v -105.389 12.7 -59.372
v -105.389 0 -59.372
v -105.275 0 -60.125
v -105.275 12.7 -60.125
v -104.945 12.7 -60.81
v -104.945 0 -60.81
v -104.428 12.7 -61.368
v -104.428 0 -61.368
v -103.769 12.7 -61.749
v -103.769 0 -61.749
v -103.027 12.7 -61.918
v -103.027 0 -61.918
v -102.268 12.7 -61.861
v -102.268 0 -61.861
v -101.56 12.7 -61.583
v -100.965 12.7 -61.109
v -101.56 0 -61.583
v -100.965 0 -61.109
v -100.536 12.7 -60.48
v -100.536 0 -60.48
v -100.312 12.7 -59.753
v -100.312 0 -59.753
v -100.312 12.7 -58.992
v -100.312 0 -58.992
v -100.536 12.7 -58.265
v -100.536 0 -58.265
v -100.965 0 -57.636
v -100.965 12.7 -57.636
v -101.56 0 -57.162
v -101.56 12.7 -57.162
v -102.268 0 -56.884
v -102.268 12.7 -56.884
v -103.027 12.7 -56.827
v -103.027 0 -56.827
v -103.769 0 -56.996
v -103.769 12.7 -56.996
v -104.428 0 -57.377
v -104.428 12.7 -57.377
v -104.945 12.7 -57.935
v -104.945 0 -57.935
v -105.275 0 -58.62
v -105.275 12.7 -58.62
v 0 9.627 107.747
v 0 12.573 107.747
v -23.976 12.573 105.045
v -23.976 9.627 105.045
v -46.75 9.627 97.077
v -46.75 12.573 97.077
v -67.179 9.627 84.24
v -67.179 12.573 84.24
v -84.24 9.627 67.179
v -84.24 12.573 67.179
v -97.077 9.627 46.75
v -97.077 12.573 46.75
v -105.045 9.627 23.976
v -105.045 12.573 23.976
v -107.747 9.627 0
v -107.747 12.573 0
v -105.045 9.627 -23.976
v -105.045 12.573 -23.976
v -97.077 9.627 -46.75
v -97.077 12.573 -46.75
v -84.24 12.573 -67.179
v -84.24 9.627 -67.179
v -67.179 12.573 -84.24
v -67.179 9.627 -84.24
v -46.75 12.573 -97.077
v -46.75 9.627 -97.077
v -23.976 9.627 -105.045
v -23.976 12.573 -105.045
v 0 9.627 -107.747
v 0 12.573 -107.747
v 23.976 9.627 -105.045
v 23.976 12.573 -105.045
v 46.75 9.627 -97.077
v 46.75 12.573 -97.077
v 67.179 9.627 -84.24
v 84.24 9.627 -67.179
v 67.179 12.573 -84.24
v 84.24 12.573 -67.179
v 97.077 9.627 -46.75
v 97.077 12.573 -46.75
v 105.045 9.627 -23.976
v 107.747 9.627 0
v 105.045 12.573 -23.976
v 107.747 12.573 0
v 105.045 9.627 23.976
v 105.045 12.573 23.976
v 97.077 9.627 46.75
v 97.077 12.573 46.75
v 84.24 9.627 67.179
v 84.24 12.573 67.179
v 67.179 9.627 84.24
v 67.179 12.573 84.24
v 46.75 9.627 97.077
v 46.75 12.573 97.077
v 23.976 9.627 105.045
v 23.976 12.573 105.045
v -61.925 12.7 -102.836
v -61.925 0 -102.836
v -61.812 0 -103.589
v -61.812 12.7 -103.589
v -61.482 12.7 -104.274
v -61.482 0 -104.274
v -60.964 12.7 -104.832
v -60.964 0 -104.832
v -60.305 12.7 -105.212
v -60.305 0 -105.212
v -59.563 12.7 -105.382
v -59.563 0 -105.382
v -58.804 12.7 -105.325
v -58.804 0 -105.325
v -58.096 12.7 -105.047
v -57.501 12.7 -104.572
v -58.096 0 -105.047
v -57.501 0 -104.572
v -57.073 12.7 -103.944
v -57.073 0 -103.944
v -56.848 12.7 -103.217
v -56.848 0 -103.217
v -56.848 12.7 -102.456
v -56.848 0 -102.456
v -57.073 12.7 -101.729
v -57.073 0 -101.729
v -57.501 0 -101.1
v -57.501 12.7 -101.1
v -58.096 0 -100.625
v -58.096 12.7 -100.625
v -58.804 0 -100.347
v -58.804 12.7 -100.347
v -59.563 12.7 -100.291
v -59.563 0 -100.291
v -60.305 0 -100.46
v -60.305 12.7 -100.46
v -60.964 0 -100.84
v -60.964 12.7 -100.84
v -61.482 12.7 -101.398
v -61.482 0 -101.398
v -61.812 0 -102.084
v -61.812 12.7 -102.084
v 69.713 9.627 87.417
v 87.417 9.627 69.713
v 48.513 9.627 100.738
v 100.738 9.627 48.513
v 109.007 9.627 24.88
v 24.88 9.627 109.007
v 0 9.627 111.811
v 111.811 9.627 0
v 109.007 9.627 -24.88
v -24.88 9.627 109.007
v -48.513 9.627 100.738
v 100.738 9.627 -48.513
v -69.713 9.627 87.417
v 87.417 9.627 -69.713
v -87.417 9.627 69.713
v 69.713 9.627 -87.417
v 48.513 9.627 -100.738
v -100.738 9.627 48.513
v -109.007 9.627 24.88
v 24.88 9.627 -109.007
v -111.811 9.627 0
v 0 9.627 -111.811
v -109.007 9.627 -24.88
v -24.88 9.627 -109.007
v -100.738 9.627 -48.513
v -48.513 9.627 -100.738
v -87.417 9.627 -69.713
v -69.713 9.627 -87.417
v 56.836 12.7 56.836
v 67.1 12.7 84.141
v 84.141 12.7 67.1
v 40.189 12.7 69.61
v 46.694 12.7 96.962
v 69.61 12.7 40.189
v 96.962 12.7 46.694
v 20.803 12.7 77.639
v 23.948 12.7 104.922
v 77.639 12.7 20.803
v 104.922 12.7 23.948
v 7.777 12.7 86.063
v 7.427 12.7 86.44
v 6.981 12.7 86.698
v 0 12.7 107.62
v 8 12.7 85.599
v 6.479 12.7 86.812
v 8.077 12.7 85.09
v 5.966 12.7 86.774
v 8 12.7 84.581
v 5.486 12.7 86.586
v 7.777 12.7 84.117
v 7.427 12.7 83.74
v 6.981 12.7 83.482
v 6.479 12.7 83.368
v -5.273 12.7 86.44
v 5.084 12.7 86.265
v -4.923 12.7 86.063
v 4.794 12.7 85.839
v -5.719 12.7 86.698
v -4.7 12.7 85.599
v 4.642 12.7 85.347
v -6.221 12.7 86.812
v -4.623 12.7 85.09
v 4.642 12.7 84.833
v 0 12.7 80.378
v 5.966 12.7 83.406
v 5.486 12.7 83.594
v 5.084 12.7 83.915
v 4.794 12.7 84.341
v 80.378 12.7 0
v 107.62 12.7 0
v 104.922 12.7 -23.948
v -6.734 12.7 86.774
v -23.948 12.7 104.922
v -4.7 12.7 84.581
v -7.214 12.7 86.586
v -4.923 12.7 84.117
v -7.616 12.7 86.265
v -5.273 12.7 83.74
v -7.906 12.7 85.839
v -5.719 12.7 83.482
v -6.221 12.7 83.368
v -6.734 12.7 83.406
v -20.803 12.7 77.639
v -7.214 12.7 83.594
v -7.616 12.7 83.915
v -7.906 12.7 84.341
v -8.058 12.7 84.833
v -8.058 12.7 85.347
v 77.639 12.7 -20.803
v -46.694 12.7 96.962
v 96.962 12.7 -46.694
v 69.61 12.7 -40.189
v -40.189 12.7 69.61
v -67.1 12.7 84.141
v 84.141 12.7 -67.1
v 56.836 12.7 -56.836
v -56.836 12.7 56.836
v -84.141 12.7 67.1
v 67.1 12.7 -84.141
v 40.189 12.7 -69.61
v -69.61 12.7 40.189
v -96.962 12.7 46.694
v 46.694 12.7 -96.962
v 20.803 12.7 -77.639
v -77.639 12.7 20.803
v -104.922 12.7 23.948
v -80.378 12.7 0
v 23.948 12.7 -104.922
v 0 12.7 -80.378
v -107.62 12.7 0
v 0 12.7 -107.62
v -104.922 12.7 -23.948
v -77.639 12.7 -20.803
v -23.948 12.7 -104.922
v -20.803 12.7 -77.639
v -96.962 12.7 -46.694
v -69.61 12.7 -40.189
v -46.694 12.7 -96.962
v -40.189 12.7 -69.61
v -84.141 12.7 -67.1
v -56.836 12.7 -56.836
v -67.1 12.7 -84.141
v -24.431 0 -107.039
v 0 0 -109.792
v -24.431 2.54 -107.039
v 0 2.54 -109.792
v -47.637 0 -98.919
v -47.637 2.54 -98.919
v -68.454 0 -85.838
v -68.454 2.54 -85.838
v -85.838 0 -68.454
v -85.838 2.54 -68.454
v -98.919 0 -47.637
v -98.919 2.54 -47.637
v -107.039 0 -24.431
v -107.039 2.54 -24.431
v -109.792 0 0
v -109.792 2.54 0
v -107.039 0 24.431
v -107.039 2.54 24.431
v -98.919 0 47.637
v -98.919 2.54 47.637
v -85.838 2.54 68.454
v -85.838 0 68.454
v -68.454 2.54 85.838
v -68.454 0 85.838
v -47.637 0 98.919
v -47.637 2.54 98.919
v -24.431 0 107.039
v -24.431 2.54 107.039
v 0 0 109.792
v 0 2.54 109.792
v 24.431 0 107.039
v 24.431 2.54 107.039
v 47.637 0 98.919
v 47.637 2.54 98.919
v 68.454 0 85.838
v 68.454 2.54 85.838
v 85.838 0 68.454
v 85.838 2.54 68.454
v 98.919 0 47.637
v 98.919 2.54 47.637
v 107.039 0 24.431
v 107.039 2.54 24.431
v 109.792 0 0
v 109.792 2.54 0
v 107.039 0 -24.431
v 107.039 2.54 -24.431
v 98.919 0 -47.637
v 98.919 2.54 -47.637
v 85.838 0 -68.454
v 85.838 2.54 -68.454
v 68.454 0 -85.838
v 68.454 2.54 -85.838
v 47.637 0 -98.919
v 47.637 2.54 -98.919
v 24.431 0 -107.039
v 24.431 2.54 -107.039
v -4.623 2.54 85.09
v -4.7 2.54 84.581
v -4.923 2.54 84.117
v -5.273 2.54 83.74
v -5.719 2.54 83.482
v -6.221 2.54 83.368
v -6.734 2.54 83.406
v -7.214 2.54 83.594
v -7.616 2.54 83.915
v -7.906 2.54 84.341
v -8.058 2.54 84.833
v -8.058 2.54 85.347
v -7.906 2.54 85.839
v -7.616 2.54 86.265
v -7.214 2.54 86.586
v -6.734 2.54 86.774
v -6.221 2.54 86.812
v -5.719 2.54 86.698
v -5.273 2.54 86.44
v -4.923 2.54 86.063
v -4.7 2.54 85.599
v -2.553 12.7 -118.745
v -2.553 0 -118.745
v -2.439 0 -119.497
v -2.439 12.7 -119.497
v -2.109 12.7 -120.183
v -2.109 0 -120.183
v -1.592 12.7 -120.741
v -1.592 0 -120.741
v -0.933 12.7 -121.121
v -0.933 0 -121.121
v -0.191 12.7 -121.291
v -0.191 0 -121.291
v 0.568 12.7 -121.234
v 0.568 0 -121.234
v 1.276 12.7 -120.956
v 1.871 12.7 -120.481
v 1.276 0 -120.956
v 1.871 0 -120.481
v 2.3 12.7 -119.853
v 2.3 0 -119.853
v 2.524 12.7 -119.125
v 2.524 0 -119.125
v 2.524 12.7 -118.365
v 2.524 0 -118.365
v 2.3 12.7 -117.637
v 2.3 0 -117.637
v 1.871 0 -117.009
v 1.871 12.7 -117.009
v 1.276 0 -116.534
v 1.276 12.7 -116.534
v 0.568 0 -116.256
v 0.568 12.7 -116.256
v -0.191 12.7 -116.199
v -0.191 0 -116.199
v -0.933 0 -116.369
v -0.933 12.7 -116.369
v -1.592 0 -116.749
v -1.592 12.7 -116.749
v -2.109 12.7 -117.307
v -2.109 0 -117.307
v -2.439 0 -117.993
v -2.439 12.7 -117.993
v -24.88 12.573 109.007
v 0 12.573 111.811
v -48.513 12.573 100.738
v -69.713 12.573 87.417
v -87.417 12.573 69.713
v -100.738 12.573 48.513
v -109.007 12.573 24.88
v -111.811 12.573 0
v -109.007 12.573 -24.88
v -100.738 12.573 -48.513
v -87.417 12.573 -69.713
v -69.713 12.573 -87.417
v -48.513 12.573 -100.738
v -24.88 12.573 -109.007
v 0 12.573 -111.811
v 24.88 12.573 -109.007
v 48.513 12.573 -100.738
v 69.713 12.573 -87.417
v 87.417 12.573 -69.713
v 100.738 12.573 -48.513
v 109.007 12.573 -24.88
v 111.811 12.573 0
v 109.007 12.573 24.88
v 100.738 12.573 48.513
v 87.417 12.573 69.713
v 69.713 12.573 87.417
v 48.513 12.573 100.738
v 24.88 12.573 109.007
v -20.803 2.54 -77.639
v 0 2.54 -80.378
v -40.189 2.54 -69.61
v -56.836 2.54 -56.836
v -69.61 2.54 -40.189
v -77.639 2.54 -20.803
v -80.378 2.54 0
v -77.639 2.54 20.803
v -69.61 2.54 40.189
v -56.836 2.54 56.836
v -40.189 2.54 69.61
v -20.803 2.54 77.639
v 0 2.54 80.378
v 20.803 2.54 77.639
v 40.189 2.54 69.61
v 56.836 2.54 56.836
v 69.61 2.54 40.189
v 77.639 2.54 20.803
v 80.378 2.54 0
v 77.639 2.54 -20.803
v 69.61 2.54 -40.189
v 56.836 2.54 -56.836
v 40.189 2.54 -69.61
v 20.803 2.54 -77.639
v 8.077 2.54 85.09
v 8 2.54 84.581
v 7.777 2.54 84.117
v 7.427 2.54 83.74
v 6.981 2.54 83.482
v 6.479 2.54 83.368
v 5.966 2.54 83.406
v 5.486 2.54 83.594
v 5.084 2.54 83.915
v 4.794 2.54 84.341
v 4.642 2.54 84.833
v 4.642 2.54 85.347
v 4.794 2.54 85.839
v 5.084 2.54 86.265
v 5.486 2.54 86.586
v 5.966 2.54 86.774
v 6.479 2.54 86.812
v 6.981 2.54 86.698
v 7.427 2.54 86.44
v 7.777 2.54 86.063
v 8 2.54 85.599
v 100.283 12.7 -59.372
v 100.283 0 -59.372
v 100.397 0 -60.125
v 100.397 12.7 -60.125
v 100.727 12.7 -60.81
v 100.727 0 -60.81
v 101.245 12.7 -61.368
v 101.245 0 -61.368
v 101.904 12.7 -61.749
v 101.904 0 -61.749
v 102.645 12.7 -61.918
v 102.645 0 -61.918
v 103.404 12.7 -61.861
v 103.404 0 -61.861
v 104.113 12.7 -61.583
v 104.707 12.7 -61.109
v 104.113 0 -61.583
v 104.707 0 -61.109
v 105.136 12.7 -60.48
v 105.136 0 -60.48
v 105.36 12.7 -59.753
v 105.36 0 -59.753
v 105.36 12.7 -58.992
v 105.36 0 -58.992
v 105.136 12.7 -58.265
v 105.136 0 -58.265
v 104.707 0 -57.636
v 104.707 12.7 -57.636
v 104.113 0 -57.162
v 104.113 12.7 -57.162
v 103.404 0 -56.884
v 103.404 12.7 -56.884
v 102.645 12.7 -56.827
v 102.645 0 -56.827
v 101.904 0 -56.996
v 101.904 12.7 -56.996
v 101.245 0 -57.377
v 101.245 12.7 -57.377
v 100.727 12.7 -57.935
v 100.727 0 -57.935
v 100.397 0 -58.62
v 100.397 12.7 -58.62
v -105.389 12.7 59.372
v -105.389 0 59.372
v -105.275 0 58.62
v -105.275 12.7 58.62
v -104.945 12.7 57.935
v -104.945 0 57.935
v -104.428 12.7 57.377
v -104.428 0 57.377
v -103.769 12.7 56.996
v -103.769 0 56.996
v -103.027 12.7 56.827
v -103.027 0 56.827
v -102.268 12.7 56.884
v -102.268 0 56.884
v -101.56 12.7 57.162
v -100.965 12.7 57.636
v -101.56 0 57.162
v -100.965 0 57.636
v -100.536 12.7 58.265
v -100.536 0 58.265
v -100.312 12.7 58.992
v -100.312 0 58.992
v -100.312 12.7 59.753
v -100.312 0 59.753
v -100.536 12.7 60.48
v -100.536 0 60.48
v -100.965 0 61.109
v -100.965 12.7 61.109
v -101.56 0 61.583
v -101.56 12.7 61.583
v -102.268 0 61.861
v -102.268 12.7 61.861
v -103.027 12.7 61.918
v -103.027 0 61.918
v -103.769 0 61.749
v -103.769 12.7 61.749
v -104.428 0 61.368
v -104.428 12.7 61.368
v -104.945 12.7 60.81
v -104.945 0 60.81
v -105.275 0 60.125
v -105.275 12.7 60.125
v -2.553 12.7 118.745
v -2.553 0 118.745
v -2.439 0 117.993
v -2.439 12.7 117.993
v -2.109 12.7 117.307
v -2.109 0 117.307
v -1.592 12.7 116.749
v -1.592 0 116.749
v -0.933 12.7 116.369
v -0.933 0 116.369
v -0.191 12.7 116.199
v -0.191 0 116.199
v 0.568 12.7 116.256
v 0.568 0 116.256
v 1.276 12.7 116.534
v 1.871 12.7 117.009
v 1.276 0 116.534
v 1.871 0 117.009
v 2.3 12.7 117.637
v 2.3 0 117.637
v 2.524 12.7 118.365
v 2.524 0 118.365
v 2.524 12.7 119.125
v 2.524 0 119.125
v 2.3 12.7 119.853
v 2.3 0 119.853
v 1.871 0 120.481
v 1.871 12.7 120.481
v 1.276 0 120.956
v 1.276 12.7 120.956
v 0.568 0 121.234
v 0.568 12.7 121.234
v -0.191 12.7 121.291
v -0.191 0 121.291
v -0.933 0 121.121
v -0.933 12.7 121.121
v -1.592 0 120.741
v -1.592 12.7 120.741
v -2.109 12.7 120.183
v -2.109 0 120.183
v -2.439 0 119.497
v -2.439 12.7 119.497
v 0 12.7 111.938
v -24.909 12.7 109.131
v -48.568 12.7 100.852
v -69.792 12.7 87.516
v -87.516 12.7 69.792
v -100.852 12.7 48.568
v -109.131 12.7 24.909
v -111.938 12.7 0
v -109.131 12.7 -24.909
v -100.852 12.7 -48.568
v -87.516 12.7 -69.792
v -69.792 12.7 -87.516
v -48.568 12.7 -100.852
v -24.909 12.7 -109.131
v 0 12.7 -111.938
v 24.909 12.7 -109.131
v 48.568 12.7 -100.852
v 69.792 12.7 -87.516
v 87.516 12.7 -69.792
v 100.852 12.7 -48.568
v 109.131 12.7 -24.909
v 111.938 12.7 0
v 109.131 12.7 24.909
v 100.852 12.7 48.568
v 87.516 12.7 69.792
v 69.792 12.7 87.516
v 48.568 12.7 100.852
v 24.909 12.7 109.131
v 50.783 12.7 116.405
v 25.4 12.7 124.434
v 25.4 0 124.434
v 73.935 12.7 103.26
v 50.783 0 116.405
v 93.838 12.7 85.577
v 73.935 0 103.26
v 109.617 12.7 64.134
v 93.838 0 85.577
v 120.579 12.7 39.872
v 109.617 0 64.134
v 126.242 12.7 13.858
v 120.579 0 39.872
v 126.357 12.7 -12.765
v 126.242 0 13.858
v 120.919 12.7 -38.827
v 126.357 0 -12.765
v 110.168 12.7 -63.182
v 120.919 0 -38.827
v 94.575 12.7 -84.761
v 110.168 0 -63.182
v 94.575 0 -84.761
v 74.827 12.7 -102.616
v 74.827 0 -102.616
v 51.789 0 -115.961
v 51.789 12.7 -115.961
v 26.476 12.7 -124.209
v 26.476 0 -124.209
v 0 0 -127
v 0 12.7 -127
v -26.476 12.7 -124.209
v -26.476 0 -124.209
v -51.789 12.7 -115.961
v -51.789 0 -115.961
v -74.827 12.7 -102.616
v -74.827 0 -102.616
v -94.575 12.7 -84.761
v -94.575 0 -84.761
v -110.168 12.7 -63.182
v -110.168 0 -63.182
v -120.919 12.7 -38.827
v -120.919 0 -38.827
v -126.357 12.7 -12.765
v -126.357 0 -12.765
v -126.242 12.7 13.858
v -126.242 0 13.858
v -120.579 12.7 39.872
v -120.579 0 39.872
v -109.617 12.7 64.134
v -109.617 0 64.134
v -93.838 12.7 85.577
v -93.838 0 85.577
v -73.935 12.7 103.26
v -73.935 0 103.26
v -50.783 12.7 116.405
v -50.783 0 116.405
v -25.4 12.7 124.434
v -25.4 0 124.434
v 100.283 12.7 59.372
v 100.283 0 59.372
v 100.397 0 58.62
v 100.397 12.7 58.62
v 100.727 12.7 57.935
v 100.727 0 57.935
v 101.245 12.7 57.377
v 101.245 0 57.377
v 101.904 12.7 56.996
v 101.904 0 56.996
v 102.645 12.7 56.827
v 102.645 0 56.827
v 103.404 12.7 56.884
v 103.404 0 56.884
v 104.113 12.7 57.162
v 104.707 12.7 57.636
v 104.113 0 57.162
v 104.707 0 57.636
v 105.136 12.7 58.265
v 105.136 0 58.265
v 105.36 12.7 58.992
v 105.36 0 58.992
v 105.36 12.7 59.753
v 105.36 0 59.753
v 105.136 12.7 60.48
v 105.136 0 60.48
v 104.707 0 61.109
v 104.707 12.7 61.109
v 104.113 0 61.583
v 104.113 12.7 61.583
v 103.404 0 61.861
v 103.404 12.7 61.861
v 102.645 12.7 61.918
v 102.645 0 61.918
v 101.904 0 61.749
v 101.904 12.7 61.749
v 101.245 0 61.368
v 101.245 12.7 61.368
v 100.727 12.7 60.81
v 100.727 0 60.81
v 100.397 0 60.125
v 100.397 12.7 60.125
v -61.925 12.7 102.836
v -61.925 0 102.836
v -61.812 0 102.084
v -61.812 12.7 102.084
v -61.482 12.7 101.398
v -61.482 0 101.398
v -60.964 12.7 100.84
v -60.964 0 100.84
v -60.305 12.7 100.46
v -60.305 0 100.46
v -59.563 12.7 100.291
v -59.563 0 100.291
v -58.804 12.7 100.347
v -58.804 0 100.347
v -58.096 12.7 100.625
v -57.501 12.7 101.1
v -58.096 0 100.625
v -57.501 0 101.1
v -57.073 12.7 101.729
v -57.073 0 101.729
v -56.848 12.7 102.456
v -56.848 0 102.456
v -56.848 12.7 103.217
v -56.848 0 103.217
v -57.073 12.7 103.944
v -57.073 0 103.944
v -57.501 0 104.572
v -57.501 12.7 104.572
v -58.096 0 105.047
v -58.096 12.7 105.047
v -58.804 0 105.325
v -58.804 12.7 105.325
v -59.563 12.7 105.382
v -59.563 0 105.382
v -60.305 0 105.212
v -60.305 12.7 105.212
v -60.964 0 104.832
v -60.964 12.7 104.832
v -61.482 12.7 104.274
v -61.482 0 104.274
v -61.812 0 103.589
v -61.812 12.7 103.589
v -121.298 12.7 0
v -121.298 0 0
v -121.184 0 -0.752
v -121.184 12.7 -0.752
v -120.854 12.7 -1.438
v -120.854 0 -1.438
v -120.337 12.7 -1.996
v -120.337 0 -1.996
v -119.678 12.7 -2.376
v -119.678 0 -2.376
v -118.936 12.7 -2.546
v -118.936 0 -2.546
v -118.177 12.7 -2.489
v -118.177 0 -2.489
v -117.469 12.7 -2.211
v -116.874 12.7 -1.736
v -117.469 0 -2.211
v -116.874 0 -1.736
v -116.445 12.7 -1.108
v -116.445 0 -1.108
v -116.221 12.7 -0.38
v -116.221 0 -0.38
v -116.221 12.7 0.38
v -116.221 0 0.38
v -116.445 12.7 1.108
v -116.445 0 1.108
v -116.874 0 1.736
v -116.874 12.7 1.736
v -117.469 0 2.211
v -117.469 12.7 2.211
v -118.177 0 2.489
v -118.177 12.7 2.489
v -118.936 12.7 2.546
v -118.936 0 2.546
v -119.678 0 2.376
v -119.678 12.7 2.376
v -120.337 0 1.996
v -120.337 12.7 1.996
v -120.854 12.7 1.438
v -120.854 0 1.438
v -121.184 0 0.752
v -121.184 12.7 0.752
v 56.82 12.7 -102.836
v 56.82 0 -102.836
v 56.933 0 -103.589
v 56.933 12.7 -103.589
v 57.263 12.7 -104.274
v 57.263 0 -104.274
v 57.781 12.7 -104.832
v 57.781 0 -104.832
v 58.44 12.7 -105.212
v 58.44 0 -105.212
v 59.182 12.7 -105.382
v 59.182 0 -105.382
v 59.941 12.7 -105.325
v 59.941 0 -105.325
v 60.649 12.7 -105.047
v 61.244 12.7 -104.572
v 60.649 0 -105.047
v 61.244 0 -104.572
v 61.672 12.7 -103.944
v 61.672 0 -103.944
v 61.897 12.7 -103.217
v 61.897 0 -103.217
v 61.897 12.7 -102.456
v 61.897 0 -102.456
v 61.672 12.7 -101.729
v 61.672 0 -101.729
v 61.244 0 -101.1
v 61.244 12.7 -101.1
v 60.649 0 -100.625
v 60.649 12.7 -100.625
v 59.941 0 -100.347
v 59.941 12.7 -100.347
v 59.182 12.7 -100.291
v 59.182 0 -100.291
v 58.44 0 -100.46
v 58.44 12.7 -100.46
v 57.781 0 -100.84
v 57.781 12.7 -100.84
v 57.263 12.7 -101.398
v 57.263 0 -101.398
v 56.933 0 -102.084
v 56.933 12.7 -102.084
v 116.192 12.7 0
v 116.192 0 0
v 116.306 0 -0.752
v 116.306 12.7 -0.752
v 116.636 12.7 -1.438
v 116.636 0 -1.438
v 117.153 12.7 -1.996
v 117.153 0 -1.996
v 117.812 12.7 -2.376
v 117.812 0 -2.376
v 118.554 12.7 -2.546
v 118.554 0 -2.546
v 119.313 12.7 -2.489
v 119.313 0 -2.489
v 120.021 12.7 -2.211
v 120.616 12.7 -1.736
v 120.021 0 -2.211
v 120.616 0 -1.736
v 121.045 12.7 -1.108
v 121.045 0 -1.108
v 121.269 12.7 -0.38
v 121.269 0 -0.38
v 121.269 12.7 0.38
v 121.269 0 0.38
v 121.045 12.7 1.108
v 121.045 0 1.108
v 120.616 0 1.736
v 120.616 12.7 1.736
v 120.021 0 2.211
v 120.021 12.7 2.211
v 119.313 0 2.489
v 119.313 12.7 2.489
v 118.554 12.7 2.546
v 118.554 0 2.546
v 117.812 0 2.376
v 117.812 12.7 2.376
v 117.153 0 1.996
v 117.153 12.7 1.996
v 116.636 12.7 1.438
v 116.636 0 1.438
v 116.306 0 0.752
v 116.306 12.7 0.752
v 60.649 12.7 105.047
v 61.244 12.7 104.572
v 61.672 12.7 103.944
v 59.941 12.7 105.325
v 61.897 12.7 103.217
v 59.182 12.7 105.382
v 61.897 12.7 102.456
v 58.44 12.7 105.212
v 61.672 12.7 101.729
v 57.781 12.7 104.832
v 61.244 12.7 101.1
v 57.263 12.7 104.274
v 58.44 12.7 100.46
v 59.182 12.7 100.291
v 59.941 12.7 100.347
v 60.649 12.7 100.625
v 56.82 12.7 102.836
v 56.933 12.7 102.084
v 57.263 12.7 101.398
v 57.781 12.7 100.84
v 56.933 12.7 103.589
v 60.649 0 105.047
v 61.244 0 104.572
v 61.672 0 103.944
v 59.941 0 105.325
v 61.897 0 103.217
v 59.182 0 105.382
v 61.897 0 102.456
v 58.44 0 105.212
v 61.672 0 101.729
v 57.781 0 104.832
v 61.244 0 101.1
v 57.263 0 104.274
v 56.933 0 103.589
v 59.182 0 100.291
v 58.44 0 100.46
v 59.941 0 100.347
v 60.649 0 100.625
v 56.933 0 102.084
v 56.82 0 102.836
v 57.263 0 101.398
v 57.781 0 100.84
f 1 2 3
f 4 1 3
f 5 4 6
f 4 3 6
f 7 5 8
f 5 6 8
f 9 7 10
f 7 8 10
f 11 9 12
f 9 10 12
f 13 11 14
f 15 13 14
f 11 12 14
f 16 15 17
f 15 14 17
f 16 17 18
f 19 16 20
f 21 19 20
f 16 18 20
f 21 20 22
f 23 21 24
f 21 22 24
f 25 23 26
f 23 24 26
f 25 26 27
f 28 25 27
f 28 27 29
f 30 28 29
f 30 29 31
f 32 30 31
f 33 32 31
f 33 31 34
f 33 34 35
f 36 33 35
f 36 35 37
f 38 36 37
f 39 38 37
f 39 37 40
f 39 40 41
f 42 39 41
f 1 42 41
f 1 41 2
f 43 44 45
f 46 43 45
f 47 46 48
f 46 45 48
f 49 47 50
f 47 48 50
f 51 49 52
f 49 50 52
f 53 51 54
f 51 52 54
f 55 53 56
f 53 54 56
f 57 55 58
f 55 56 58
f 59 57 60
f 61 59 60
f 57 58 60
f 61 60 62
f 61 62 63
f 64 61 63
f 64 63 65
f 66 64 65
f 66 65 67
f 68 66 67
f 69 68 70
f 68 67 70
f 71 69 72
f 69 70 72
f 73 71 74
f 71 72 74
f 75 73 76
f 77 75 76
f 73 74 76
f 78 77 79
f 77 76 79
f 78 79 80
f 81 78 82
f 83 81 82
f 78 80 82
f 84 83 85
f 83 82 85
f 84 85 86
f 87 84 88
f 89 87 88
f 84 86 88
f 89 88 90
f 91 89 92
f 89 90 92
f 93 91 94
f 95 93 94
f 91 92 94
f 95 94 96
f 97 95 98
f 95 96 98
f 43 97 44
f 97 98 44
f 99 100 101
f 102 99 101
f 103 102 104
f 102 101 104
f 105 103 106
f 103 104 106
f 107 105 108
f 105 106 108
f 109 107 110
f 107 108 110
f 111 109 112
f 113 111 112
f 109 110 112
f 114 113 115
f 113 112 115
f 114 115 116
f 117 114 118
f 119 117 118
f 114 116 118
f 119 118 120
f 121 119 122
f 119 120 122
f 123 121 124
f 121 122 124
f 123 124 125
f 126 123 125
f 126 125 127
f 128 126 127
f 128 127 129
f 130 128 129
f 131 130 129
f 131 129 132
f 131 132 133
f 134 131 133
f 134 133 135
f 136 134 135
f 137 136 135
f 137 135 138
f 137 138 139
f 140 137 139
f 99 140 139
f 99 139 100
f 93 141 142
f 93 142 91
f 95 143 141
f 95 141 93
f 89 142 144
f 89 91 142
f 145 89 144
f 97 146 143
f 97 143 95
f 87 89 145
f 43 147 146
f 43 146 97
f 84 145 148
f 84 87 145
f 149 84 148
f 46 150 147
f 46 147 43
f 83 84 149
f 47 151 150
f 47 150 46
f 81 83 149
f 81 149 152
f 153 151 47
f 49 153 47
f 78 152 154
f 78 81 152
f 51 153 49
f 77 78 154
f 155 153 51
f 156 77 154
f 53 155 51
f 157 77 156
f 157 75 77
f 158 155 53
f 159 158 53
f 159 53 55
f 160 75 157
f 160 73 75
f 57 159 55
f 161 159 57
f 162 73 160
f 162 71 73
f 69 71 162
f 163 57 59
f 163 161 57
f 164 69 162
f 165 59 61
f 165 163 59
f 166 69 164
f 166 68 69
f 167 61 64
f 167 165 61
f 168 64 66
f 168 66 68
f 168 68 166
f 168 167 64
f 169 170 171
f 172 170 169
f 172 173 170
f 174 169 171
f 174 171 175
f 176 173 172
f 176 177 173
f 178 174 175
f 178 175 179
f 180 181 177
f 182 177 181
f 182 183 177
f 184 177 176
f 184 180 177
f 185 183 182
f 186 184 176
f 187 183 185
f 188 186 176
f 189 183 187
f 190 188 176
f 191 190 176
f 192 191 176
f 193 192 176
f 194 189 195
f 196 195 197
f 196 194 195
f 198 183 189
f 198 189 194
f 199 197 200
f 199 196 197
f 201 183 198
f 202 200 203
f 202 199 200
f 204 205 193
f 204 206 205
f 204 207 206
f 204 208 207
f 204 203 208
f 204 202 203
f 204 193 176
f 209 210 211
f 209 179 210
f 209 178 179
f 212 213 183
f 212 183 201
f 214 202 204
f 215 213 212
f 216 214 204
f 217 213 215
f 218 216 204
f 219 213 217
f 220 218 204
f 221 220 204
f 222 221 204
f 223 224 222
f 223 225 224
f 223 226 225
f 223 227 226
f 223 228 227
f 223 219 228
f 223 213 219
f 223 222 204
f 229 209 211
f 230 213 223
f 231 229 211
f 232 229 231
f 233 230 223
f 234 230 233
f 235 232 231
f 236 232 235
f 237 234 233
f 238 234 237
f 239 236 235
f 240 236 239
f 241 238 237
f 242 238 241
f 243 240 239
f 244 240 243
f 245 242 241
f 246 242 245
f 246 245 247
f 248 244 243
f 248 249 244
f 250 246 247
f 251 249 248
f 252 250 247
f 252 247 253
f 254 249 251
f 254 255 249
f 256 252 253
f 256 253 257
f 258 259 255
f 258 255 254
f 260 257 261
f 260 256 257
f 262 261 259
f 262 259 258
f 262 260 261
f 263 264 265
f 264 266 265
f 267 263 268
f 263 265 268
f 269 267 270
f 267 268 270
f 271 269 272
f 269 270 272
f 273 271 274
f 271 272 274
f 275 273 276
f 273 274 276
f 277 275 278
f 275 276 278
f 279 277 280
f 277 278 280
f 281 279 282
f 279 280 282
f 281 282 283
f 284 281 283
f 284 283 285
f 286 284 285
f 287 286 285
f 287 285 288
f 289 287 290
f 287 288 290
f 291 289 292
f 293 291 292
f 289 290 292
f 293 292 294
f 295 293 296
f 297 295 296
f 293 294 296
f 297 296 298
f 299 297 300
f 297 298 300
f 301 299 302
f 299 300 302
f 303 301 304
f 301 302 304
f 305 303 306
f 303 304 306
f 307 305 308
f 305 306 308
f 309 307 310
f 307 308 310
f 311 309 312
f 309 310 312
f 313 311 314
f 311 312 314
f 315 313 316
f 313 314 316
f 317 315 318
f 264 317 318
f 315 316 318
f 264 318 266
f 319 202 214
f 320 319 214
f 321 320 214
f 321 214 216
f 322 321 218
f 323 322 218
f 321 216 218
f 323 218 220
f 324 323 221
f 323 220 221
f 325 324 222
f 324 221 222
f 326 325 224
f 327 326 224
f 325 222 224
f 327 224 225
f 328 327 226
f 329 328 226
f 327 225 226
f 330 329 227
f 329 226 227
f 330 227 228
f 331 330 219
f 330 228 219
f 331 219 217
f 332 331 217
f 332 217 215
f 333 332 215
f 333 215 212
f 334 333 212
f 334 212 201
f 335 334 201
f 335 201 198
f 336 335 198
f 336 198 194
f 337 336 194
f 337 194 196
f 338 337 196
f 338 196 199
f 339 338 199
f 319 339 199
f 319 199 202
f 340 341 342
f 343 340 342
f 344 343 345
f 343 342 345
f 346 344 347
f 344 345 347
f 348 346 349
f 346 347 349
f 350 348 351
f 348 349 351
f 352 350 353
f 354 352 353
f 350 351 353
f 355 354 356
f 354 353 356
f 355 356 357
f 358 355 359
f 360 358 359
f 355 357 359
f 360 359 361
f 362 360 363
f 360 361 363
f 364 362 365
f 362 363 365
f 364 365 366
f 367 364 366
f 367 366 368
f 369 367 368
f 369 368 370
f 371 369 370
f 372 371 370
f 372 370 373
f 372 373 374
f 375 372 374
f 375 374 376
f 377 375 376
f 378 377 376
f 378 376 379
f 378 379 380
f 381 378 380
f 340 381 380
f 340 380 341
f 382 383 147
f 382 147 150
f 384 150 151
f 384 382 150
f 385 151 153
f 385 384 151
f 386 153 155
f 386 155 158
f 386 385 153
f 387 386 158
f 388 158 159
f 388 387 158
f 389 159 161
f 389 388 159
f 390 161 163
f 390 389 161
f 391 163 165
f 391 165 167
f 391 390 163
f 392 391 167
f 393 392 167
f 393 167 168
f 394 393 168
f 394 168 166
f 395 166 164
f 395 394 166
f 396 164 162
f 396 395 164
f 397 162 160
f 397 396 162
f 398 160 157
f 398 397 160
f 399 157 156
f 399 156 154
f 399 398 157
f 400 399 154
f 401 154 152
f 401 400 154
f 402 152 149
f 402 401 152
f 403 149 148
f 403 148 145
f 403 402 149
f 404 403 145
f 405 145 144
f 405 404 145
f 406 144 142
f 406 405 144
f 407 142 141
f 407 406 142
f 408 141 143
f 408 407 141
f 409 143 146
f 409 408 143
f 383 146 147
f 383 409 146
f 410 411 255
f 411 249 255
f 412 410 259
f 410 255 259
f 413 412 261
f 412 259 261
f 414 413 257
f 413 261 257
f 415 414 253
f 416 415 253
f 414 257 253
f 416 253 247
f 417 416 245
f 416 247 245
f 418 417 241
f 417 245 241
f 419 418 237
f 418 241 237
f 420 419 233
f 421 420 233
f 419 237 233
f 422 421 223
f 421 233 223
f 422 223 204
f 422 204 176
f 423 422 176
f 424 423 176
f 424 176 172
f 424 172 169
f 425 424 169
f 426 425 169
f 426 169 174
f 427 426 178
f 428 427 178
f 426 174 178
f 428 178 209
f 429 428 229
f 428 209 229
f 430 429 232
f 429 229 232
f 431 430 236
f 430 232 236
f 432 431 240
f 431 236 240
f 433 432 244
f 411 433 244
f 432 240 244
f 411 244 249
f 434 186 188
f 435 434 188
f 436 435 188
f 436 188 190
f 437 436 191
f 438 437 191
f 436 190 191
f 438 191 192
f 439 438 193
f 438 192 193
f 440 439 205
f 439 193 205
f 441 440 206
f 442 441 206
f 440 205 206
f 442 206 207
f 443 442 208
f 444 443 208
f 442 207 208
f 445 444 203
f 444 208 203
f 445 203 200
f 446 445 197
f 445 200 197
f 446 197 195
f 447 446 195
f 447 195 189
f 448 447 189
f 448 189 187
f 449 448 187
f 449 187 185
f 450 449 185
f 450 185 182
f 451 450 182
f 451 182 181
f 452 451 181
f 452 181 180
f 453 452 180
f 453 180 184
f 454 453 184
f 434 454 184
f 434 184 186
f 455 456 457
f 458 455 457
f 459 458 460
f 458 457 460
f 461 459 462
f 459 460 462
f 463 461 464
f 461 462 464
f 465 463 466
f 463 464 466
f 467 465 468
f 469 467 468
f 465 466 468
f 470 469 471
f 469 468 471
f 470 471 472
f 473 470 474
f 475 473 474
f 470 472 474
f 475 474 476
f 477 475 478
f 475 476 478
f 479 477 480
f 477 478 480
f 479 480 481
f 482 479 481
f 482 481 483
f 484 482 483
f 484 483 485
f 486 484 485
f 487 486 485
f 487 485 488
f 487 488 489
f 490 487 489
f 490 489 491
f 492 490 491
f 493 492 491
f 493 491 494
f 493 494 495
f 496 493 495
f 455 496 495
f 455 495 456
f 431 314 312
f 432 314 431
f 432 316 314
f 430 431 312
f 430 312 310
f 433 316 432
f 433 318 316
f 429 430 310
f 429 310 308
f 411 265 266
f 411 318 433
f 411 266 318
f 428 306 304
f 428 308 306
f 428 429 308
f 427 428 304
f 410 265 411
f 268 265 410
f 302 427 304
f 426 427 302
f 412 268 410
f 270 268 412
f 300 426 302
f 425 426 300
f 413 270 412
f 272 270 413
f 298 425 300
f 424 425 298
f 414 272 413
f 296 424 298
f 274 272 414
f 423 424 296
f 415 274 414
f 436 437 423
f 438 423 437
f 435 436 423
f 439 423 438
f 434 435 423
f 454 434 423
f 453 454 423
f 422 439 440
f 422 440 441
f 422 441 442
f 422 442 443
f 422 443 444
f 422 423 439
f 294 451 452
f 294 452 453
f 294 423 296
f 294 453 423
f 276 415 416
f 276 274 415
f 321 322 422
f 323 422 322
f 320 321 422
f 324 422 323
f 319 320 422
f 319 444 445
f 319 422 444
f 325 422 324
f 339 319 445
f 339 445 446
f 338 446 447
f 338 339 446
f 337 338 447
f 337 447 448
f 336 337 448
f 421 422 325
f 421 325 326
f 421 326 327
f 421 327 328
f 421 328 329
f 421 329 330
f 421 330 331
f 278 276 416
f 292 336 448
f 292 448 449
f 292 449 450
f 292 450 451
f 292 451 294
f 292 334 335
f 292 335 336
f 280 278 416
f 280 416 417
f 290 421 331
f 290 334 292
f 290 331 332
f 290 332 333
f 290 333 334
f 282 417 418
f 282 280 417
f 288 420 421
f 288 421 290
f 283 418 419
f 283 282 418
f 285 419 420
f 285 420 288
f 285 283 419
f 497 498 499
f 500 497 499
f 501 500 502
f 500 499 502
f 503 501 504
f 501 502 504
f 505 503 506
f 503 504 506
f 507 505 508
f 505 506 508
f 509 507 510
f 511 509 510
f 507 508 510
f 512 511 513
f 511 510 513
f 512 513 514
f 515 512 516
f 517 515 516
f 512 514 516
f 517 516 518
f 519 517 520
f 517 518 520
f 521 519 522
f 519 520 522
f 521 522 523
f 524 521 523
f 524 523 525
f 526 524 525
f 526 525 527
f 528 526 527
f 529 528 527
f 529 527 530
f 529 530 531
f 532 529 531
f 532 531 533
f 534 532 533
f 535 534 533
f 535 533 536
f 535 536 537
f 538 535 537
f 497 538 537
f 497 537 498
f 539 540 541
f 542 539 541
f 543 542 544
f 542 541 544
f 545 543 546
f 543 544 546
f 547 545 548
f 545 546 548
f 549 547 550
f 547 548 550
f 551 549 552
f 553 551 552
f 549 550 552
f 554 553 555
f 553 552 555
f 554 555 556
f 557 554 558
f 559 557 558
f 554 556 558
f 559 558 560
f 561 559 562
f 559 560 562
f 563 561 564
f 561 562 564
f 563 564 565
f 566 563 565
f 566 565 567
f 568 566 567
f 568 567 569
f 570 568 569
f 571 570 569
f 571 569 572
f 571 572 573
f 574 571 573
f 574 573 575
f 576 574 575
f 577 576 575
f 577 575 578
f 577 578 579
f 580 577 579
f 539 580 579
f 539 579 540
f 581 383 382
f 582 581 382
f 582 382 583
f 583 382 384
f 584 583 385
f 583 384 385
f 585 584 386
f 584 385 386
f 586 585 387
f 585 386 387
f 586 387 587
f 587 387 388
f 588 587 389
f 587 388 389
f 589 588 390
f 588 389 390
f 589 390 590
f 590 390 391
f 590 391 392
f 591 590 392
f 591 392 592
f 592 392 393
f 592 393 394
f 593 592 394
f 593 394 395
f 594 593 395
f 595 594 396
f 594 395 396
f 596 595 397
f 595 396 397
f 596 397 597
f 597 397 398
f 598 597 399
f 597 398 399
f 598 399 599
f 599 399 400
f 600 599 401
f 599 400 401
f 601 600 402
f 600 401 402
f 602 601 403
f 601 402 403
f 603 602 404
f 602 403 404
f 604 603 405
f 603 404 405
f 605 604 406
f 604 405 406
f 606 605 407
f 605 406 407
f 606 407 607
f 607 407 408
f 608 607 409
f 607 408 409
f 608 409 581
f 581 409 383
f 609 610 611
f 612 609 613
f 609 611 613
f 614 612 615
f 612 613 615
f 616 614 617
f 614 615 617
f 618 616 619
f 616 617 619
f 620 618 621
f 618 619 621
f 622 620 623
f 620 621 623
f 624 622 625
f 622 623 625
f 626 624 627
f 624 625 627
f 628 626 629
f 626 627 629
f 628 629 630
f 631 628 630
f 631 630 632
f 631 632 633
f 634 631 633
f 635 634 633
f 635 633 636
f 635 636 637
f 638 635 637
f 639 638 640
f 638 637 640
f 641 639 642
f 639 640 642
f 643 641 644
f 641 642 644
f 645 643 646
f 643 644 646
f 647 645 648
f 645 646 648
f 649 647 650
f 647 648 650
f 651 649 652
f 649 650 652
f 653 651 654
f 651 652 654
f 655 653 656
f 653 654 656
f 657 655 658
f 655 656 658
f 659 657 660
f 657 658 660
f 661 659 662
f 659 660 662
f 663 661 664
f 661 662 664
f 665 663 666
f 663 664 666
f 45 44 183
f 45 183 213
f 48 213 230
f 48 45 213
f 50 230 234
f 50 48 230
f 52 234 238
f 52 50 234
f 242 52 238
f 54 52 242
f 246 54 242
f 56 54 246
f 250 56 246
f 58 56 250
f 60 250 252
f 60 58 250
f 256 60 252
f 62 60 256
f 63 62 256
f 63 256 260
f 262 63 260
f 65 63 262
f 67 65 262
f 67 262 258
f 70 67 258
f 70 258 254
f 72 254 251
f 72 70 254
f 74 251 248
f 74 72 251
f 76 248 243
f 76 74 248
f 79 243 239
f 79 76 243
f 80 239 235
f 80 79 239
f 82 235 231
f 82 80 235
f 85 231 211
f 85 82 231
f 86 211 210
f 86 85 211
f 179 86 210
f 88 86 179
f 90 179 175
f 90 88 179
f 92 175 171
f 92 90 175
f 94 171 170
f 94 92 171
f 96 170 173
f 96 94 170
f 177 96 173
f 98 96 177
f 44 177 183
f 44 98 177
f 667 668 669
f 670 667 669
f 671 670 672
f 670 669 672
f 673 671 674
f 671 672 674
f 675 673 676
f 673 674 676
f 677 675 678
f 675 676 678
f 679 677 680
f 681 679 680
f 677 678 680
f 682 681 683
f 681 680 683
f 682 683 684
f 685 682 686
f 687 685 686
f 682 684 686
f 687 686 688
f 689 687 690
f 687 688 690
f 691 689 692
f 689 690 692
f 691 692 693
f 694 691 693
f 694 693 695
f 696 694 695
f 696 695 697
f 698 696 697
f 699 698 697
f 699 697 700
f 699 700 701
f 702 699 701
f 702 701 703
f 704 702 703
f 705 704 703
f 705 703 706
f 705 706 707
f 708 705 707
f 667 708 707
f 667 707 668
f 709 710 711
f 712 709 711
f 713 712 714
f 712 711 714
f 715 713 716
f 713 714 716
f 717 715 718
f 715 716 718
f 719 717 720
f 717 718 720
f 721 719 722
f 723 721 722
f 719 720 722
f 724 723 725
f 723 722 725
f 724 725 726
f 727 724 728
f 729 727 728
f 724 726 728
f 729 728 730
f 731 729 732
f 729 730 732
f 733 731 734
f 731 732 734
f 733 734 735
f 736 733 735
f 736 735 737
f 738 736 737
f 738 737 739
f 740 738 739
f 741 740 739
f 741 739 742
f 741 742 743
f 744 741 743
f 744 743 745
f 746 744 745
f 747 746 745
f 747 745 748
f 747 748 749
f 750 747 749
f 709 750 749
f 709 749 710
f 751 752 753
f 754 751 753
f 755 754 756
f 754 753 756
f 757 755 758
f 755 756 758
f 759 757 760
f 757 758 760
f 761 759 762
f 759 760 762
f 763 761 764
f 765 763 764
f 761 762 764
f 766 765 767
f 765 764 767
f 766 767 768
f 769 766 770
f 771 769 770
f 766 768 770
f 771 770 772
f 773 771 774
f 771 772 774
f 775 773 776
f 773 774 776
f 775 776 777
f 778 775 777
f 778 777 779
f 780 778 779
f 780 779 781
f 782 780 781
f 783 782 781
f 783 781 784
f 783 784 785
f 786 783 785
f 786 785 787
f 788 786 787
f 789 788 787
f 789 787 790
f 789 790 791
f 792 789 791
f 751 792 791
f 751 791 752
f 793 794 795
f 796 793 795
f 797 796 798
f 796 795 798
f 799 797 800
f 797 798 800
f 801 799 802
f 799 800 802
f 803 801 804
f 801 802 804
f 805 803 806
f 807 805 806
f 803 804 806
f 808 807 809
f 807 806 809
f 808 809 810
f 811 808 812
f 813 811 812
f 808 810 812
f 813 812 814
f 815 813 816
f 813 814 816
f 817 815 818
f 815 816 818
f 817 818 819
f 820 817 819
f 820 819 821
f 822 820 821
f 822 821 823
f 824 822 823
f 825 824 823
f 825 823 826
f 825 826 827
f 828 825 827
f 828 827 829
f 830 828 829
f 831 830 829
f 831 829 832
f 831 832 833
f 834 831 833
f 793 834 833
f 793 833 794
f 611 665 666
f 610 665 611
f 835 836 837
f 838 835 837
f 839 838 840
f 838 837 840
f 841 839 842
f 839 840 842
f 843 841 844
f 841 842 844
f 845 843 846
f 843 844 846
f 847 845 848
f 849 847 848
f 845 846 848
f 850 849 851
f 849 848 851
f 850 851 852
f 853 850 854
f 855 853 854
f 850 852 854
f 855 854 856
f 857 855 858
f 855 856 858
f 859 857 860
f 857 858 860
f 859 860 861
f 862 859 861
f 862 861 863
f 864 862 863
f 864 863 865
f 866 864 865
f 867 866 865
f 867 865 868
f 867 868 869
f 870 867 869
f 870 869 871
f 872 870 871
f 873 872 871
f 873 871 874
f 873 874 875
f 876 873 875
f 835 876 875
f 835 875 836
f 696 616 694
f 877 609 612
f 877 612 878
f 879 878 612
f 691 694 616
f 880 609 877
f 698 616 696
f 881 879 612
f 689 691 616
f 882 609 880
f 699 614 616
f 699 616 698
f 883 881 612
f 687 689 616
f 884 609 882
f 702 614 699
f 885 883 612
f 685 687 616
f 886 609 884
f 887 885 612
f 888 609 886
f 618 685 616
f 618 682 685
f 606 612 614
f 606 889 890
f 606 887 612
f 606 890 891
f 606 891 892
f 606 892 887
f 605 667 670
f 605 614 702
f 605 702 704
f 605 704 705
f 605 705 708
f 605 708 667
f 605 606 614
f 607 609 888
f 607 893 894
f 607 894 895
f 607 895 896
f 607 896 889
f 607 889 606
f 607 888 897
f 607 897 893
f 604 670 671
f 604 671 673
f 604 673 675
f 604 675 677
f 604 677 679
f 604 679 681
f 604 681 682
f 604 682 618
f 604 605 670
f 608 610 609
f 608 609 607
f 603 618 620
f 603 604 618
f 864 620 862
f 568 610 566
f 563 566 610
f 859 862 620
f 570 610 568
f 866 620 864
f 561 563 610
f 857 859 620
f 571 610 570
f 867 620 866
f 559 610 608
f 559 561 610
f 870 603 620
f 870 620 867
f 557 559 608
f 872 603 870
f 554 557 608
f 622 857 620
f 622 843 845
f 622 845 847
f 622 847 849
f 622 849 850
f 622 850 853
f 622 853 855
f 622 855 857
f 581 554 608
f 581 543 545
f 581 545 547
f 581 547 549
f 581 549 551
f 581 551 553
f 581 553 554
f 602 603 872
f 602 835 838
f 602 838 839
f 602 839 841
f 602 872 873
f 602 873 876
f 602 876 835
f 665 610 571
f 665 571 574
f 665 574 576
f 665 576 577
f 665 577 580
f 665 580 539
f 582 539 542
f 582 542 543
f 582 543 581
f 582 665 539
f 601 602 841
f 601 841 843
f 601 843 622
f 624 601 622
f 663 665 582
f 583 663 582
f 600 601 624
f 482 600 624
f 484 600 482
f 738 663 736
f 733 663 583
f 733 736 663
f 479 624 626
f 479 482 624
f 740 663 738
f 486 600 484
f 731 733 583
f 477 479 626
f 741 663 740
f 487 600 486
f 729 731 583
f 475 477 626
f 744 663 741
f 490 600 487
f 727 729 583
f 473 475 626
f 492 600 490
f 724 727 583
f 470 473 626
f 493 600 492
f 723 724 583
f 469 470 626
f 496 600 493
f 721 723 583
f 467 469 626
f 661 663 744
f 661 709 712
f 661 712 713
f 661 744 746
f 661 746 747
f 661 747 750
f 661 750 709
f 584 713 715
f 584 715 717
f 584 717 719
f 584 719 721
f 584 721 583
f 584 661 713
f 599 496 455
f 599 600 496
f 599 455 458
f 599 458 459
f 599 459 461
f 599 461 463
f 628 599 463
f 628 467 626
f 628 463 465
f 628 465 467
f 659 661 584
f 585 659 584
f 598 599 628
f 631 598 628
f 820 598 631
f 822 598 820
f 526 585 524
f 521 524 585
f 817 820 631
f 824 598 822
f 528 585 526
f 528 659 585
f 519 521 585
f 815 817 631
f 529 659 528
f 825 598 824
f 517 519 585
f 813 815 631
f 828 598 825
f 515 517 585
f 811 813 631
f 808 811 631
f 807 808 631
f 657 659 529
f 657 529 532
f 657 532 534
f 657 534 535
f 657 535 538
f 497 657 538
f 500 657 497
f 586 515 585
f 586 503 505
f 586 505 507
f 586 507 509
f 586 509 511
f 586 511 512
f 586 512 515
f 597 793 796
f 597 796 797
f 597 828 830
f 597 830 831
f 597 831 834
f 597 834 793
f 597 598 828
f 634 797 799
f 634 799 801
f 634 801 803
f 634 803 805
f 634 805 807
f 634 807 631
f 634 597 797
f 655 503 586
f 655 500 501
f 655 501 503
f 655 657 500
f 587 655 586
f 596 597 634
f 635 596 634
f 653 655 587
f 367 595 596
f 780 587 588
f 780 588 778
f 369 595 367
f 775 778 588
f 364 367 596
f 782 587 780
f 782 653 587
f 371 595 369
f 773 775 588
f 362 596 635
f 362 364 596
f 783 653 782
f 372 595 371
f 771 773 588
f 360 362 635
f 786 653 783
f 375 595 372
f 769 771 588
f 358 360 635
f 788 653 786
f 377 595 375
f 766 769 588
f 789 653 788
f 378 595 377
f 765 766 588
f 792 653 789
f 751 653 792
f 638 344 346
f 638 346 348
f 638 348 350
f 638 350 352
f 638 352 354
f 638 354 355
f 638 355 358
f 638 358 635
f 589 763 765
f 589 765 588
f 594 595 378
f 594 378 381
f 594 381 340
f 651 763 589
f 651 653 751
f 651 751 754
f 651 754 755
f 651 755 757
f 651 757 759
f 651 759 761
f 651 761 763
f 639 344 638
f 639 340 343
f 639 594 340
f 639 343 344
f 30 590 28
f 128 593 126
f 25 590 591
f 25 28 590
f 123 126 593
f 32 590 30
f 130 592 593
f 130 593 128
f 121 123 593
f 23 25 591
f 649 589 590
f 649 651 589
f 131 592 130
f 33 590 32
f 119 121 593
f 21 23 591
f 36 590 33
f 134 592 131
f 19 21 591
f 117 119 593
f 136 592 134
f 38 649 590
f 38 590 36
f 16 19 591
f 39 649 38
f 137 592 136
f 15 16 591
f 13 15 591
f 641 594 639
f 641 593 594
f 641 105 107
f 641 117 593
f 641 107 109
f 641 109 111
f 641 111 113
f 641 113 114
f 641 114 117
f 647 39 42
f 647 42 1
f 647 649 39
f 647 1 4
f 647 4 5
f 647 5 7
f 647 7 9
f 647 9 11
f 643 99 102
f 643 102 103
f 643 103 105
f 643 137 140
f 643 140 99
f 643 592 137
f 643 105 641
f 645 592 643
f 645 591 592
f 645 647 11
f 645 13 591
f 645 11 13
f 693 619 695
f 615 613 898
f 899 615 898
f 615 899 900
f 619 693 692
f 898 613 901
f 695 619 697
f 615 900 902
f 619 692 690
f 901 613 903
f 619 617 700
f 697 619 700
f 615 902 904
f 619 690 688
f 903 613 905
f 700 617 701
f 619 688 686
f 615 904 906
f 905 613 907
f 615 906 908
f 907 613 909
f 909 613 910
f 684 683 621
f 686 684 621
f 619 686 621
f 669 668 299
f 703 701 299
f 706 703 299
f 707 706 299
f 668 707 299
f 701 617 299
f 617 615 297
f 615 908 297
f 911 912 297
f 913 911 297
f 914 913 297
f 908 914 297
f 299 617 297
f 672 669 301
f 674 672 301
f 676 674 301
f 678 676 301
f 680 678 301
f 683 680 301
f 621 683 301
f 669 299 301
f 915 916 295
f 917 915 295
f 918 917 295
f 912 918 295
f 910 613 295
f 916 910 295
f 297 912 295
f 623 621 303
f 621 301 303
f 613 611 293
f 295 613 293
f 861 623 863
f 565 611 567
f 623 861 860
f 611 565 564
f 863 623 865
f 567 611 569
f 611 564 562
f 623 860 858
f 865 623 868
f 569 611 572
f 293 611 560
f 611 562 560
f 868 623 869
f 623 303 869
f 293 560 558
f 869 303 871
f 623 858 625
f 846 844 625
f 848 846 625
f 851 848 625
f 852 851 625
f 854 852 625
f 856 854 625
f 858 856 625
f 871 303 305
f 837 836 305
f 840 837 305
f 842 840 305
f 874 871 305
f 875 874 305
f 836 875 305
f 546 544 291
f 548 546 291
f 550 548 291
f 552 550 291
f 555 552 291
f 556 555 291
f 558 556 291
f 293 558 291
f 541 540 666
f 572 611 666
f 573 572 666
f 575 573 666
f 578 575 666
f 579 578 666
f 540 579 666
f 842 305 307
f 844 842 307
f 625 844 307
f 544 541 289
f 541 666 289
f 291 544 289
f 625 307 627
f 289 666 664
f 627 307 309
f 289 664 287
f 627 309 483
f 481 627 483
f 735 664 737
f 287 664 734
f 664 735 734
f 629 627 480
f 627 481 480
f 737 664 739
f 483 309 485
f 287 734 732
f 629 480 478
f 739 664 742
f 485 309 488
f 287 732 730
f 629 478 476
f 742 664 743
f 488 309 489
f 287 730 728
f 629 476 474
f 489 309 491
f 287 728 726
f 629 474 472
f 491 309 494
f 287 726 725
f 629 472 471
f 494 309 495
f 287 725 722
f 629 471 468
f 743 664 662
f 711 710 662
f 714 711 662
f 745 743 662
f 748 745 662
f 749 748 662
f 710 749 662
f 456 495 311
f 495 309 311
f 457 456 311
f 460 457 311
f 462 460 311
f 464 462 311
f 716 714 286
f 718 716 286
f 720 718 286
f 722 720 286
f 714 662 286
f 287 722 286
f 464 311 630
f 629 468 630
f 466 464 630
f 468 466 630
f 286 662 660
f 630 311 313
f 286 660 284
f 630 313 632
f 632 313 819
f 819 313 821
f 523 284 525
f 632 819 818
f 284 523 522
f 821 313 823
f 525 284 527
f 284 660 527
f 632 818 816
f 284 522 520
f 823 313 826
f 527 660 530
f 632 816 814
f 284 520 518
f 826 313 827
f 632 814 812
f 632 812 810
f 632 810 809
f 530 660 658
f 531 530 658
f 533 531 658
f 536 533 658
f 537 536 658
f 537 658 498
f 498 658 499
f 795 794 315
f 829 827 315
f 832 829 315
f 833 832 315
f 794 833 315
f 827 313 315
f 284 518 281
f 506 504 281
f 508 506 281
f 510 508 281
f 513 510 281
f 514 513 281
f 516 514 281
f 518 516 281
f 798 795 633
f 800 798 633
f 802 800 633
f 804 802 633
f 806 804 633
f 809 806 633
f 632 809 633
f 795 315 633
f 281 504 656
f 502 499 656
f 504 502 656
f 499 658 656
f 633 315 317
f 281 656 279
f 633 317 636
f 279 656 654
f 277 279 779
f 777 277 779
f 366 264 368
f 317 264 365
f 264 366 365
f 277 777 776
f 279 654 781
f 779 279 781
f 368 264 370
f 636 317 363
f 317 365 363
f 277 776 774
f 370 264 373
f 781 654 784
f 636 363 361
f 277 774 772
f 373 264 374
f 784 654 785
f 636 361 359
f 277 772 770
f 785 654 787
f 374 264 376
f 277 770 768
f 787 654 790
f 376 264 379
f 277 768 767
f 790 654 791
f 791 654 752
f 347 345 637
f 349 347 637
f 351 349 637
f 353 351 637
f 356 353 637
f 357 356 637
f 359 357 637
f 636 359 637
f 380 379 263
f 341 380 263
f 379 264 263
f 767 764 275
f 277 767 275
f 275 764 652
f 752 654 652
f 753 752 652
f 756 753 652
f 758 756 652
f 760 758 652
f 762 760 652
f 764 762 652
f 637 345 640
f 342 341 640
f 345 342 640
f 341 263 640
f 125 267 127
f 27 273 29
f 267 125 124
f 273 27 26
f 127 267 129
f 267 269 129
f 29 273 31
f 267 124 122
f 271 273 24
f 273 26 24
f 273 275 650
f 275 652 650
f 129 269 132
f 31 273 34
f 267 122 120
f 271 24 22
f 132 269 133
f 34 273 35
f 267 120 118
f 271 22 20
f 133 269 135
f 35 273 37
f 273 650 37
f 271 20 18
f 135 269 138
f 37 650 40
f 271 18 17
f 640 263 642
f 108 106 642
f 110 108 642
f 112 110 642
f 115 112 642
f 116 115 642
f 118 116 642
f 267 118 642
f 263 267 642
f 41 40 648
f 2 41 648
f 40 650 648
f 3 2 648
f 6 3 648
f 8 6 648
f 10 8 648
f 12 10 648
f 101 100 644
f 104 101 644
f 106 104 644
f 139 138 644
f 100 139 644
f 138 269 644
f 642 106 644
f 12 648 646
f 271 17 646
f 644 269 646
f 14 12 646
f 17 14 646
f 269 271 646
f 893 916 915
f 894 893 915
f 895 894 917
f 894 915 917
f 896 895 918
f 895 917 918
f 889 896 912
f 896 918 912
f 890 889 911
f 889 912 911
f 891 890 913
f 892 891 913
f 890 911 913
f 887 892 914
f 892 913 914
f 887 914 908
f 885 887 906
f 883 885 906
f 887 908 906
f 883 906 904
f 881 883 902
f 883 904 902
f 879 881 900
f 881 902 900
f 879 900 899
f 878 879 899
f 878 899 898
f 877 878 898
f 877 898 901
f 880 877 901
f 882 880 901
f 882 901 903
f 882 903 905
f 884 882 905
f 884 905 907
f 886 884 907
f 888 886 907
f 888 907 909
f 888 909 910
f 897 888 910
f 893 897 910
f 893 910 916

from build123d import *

# Parameters (mm, degrees)
F_1_4_20_TAPPED_HOLE1_D = 5.1054
SKETCH4_W               = 4.064
SKETCH4_H               = 3.0734
CHAMFER1_SIZE           = 0.127
F_8_32_TAPPED_HOLE1_D   = 3.4544
CUT_EXTRUDE1_REACH      = 182.054
SKETCH7_W               = 50.8
SKETCH7_H               = 2.565921067


with BuildPart() as part:
    # Sketch1 → Revolve1 (revolve)
    with BuildSketch(Plane.XY, mode=Mode.PRIVATE) as revolve1_sk:
        Polygon((109.7915, 0), (109.7915, 2.54), (105.7783, 2.54), (80.3783, 2.54), (80.3783, 12.7), (105.7783, 12.7), (127, 12.7), (127, 0), align=None)
    revolve(revolve1_sk.sketch.rotate(Axis((0, 0, 0), (0, 1, 0)), 90), axis=Axis((0, 0, 0), (0, 1, 0)))

    # 1/4-20 Tapped Hole1 (through all)
    with Locations(Plane(origin=(0, 12.7, 0), x_dir=(1, 0, 0), z_dir=(0, 1, 0))):
        with Locations((0, 118.745), (59.3725, 102.836186572), (102.836186572, 59.3725), (118.745, 0), (102.836186572, -59.3725), (59.3725, -102.836186572), (0, -118.745), (-59.3725, -102.836186572), (-102.836186572, -59.3725), (-118.745, 0), (-102.836186572, 59.3725), (-59.3725, 102.836186572)):
            Hole(F_1_4_20_TAPPED_HOLE1_D / 2)

    # Sketch4 → Cut-Revolve1 (revolve, cut)
    with BuildSketch(Plane.XY, mode=Mode.PRIVATE) as cut_revolve1_sk:
        with Locations((109.7788, 11.1633)):
            Rectangle(SKETCH4_W, SKETCH4_H)
    revolve(cut_revolve1_sk.sketch.rotate(Axis((0, 12.7, 0), (0, -1, 0)), 90), axis=Axis((0, 12.7, 0), (0, -1, 0)), mode=Mode.SUBTRACT)

    # Chamfer1
    chamfer1_edges = [part.edges().sort_by_distance(p)[0] for p in [
        (0, 12.7, -107.7468),
        (0, 12.7, -111.8108),
    ]]
    chamfer(chamfer1_edges, length=CHAMFER1_SIZE)

    # #8-32 Tapped Hole1 (through all)
    with Locations(Plane(origin=(0, 2.54, 0), x_dir=(-1, 0, 0), z_dir=(0, -1, 0))):
        with Locations((6.35, -85.09), (-6.35, -85.09)):
            Hole(F_8_32_TAPPED_HOLE1_D / 2)

    # Sketch7 → Cut-Extrude1 (cut, up to next)
    with BuildSketch(Plane(origin=(0, 12.7, 0), x_dir=(1, 0, 0), z_dir=(0, 1, 0)), mode=Mode.PRIVATE) as cut_extrude1_sk1:
        with Locations((0, -125.717039467)):
            Rectangle(SKETCH7_W, SKETCH7_H)
    cut_extrude1_tool1 = extrude(cut_extrude1_sk1.sketch, amount=-CUT_EXTRUDE1_REACH, mode=Mode.PRIVATE) & part.part
    add(cut_extrude1_tool1.solids().sort_by_distance((0, 12.7, 125.717039))[0], mode=Mode.SUBTRACT)


solid = part.part
